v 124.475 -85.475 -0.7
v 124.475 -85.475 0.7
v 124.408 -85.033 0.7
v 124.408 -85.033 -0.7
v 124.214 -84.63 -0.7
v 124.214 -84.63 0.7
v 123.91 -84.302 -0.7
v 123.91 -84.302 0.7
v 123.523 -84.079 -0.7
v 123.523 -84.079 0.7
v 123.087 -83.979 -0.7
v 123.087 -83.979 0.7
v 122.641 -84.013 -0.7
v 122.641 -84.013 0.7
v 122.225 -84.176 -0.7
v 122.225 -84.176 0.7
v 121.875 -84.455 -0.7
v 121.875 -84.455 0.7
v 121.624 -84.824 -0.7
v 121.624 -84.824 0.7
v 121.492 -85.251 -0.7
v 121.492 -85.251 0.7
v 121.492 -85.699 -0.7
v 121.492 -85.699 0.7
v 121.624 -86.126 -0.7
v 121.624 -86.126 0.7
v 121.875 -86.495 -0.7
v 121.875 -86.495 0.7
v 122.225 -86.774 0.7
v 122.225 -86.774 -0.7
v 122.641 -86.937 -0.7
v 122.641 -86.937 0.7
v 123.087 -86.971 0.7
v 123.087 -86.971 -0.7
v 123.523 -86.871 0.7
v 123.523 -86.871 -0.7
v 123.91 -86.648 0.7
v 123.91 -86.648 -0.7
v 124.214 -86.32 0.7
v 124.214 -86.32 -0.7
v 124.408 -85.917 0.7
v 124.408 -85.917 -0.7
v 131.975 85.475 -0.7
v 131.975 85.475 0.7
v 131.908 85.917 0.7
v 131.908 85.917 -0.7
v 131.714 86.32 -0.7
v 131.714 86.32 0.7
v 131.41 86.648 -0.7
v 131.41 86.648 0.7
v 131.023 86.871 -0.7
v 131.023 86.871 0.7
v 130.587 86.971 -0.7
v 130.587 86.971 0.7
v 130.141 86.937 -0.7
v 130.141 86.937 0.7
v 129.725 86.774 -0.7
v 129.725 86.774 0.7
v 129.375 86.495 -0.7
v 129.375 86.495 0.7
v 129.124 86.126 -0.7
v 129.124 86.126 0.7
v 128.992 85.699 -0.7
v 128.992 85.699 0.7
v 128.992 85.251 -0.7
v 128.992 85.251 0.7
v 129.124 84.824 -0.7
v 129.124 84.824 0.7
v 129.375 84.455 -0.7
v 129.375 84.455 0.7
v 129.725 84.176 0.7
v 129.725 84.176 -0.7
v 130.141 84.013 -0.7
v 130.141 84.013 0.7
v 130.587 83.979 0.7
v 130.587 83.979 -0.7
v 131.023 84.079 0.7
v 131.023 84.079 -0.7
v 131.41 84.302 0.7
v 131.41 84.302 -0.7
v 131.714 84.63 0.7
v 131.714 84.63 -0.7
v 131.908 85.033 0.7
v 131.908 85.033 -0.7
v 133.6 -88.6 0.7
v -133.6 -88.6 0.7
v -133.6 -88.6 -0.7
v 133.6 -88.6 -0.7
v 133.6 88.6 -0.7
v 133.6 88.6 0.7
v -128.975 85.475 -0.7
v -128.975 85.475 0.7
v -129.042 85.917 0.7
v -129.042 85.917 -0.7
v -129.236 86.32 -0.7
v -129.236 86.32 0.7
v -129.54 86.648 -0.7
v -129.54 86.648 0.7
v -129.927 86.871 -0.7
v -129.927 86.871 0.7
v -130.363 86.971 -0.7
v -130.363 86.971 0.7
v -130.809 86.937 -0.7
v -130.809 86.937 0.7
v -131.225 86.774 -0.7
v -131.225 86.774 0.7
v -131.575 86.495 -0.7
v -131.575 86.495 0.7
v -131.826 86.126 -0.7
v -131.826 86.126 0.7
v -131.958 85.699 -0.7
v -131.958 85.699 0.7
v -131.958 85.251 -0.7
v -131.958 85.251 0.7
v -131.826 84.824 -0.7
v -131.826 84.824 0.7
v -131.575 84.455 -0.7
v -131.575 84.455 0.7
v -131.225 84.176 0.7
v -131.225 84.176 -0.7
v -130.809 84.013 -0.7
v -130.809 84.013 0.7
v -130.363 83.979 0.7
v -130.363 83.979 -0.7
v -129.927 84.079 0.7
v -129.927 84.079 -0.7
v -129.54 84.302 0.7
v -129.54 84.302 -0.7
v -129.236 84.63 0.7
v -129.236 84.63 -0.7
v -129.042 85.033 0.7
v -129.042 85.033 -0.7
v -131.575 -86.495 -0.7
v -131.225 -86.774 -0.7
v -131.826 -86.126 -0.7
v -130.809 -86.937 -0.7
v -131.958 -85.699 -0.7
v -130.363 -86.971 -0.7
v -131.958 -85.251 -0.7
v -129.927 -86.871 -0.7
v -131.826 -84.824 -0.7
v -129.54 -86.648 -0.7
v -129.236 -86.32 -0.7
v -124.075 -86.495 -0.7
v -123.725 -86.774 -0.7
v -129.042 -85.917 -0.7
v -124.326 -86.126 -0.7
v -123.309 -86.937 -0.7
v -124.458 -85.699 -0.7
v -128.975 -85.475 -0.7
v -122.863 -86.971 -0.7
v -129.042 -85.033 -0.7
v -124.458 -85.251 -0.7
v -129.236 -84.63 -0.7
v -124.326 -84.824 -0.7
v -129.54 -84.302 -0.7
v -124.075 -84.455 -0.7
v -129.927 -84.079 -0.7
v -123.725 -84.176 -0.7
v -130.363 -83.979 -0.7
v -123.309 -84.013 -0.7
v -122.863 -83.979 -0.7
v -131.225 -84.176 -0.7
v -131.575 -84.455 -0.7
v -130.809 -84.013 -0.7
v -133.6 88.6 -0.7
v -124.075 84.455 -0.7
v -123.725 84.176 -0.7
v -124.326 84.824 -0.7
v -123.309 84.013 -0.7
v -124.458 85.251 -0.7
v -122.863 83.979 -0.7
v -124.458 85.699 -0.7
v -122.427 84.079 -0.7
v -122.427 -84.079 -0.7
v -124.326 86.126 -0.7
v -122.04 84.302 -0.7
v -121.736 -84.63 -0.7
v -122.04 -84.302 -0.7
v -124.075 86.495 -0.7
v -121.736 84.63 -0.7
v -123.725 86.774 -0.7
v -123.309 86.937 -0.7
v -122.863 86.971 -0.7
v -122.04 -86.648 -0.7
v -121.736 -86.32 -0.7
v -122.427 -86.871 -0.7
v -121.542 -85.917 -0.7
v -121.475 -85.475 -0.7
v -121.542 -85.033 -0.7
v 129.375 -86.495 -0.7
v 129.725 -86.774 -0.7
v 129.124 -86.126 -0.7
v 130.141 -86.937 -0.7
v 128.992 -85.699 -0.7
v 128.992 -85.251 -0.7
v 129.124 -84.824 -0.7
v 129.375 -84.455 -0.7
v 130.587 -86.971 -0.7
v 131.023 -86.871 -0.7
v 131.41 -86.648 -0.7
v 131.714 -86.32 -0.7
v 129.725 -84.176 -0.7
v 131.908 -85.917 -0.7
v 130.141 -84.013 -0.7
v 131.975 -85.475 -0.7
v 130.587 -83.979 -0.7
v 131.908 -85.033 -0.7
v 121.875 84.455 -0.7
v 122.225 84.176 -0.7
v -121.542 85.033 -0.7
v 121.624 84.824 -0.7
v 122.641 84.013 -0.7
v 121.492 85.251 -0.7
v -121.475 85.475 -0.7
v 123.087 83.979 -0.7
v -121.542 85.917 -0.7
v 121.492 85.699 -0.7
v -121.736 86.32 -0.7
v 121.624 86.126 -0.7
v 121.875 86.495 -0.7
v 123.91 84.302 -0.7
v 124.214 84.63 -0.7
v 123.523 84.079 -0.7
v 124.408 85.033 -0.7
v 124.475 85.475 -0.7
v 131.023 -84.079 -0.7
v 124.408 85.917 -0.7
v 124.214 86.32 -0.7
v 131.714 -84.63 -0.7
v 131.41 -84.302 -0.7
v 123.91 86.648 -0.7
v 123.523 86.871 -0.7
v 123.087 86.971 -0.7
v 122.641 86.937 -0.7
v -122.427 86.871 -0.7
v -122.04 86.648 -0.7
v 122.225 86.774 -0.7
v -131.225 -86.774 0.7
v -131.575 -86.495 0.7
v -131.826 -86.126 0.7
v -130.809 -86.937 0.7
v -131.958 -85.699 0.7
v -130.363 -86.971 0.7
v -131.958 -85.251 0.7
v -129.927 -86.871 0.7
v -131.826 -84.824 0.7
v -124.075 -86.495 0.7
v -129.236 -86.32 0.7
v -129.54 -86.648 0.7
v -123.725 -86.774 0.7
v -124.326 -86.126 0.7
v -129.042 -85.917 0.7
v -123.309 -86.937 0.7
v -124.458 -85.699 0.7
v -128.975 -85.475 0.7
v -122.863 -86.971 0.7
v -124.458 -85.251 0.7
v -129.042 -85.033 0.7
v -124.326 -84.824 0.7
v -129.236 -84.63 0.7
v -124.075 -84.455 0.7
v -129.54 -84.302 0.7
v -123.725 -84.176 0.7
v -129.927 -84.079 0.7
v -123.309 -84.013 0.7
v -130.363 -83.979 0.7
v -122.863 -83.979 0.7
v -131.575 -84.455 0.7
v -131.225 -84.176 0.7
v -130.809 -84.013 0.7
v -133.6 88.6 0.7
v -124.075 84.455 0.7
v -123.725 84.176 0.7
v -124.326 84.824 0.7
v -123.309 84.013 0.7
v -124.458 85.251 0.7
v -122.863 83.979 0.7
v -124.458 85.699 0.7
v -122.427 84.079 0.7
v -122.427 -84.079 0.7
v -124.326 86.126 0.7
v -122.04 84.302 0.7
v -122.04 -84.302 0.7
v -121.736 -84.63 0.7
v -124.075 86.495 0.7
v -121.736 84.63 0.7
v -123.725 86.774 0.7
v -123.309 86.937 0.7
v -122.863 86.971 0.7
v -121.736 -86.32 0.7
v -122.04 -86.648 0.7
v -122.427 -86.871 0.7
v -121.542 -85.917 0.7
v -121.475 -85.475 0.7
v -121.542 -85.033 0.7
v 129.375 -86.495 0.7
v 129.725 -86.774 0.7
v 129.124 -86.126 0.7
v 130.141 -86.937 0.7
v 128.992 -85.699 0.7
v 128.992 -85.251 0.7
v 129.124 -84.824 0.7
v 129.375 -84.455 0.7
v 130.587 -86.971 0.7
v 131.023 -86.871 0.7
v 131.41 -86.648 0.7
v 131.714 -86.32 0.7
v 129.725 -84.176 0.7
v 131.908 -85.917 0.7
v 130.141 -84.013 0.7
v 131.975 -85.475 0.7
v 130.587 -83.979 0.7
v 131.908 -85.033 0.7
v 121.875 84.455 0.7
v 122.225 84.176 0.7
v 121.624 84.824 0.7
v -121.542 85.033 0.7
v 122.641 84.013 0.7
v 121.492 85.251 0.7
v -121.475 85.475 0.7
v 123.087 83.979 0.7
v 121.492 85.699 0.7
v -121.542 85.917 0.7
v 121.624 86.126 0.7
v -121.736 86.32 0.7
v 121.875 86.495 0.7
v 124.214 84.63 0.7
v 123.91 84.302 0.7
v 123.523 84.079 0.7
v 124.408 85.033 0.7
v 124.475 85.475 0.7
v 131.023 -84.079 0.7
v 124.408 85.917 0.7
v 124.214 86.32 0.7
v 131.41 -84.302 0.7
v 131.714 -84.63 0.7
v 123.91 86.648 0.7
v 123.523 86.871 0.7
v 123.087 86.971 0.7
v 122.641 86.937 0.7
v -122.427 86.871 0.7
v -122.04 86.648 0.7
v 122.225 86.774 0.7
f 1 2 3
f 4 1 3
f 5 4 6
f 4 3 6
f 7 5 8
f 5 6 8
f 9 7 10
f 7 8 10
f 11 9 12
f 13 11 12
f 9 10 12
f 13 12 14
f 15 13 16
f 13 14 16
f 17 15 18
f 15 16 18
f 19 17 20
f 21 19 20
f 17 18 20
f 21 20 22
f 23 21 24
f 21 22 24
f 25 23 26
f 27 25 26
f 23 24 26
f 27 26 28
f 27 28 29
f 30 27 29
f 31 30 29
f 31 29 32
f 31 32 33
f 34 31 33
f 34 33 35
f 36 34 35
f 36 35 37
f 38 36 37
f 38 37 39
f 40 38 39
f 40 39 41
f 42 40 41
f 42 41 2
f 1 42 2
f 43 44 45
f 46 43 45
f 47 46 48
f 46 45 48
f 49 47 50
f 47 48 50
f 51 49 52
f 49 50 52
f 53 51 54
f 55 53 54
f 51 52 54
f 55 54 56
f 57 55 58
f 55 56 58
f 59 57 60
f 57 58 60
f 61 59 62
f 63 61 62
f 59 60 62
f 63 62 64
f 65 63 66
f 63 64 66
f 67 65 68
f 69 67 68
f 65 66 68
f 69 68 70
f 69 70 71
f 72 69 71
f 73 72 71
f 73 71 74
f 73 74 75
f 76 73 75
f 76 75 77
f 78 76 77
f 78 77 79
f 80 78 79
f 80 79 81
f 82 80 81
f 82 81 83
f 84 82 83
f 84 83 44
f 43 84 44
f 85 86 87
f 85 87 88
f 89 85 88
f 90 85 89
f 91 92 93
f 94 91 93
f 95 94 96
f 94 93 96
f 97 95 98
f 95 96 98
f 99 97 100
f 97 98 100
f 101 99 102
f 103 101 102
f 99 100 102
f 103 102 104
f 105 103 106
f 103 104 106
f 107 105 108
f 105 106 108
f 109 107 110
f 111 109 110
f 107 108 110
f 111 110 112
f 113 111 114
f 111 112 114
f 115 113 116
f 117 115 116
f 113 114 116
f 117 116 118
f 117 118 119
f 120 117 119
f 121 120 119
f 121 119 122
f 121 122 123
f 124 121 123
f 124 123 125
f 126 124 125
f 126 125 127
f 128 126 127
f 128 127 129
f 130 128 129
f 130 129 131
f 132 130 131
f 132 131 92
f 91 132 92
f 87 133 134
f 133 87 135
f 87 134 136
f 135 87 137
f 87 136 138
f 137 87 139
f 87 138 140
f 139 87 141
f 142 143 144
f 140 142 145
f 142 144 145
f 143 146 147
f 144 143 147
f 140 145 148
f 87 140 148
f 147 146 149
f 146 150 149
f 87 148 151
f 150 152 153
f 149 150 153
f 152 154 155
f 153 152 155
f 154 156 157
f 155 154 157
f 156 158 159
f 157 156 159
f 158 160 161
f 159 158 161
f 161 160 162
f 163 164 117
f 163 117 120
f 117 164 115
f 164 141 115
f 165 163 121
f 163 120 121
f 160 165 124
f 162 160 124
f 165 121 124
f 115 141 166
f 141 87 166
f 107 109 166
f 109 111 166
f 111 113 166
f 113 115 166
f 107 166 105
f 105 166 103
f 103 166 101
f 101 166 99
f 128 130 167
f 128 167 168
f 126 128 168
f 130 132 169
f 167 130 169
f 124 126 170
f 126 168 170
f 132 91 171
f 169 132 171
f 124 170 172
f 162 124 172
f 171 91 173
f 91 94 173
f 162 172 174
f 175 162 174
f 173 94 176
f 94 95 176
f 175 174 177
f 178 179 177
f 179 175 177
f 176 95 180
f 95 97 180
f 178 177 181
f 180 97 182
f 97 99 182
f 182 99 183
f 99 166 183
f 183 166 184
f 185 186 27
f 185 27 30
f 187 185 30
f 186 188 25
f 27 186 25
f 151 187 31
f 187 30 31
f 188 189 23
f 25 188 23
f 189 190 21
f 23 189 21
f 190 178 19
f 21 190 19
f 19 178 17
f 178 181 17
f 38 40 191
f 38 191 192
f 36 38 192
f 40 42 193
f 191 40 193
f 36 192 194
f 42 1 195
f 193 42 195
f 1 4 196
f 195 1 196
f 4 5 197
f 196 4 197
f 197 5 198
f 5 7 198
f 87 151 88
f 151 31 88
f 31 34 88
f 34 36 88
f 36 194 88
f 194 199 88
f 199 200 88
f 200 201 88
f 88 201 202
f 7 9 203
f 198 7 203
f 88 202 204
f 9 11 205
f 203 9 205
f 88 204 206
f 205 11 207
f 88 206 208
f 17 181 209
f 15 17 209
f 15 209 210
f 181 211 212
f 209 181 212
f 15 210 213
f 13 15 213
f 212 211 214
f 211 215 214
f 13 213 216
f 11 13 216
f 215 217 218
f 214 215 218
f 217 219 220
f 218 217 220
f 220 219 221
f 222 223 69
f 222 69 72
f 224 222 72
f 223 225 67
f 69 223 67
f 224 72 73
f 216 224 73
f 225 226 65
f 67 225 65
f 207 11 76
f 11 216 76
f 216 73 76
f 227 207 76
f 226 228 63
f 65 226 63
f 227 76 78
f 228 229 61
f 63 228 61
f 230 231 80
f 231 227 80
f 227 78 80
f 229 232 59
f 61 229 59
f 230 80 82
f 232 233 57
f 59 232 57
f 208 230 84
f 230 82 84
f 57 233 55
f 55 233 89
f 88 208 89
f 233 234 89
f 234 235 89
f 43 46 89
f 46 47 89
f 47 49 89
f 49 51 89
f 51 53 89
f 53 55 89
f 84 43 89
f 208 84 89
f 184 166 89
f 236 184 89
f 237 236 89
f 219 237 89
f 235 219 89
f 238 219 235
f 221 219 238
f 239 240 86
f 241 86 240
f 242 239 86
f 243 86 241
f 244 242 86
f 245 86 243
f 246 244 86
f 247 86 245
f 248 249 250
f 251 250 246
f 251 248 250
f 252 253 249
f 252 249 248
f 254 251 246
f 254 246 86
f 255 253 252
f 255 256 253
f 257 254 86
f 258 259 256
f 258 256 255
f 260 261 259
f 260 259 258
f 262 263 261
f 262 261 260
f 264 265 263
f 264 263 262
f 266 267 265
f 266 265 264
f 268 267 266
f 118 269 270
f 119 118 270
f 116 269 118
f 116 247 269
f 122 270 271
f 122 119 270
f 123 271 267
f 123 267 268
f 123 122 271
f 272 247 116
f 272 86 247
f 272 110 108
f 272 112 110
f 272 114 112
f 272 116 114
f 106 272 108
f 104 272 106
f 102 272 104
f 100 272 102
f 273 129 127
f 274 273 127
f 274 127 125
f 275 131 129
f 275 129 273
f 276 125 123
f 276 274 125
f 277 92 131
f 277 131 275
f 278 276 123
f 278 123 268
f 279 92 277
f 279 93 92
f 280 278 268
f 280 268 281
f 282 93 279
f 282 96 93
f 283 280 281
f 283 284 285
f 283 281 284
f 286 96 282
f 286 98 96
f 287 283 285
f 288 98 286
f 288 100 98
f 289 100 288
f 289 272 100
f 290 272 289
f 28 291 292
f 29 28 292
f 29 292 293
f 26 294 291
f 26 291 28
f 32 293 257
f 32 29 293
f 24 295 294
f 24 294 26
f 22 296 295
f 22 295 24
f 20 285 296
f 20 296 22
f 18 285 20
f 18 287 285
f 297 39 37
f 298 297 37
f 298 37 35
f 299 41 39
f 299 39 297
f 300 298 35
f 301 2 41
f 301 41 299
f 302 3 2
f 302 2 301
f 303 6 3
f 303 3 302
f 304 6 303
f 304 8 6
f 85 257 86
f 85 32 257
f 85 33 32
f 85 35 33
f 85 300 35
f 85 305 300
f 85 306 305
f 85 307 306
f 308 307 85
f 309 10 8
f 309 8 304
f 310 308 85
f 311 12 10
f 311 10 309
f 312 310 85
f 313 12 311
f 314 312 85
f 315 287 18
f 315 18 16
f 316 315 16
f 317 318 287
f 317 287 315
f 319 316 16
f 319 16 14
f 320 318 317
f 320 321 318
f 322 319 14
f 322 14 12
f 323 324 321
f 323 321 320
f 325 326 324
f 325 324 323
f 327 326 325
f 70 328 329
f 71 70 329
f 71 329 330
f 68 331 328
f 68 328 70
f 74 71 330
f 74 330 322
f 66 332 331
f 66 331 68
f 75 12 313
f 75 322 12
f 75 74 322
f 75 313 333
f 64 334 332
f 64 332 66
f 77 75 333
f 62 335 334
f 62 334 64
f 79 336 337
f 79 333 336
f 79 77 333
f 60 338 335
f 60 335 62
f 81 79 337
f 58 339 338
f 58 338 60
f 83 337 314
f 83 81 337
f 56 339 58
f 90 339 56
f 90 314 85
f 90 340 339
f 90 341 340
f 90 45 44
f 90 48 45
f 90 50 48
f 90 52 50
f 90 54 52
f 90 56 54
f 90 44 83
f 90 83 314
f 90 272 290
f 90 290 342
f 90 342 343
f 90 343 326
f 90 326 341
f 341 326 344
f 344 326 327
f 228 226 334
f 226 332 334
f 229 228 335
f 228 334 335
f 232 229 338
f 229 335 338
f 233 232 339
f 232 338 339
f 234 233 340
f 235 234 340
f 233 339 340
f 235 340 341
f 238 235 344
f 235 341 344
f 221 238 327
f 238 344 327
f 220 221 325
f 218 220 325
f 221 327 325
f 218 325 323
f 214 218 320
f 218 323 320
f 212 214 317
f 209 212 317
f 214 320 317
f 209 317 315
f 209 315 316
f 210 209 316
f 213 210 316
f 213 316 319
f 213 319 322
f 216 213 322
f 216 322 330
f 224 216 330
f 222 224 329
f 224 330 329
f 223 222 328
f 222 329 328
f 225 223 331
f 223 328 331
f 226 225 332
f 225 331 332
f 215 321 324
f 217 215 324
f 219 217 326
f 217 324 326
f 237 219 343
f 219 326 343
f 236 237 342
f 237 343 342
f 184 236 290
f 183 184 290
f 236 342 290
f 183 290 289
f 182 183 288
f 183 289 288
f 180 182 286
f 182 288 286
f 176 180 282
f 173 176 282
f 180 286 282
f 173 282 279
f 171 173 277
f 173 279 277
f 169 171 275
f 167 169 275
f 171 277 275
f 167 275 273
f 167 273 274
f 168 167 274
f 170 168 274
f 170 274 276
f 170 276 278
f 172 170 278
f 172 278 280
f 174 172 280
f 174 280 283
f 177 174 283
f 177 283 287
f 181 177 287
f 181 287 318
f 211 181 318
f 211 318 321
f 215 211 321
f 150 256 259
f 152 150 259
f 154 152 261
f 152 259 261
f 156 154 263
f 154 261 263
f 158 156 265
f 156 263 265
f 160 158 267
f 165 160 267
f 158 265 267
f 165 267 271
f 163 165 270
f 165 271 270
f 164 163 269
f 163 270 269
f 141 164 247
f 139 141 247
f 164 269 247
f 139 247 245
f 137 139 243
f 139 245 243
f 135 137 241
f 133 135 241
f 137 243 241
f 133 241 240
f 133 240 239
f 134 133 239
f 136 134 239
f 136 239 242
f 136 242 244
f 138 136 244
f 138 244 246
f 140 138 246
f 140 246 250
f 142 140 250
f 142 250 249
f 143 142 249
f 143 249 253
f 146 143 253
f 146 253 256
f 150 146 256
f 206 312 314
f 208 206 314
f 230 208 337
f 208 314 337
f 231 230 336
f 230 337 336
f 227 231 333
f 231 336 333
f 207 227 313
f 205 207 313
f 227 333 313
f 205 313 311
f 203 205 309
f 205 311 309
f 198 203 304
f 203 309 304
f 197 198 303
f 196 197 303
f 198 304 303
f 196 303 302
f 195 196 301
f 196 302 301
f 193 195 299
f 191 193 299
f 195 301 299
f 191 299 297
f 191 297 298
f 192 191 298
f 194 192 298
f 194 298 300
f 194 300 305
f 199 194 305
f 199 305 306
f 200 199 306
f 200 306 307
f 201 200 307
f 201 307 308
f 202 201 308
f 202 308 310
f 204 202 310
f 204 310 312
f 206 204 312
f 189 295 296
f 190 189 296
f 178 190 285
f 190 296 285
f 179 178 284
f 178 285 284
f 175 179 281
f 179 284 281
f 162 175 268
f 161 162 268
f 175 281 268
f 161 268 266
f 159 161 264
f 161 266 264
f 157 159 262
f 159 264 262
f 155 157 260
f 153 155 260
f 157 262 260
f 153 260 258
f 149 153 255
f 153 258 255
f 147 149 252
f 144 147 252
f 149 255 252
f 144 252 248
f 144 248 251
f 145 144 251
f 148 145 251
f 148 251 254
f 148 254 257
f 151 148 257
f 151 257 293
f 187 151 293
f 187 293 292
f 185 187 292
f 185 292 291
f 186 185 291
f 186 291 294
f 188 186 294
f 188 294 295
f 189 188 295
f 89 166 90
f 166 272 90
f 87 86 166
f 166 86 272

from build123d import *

# Parameters (mm, degrees)
CROQUIS1_W              = 267.2
CROQUIS1_H              = 177.2
SALIENTE_EXTRUIR1_DEPTH = 0.7
CROQUIS2_R              = 1.5
CORTAR_EXTRUIR1_DEPTH   = 15.7


with BuildPart() as part:
    # Croquis1 → Saliente-Extruir1 (new, symmetric)
    with BuildSketch(Plane.XY):
        Rectangle(CROQUIS1_W, CROQUIS1_H)
    extrude(amount=SALIENTE_EXTRUIR1_DEPTH, both=True)

    # Croquis2 → Cortar-Extruir1 (cut, symmetric)
    with BuildSketch(Plane.XY.offset(0.7)):
        with Locations((-130.475, 85.475)):
            Circle(CROQUIS2_R)
        with Locations((-122.975, 85.475)):
            Circle(CROQUIS2_R)
        with Locations((-130.475, -85.475)):
            Circle(CROQUIS2_R)
        with Locations((-122.975, -85.475)):
            Circle(CROQUIS2_R)
        with Locations((130.475, -85.475)):
            Circle(CROQUIS2_R)
        with Locations((122.975, -85.475)):
            Circle(CROQUIS2_R)
        with Locations((130.475, 85.475)):
            Circle(CROQUIS2_R)
        with Locations((122.975, 85.475)):
            Circle(CROQUIS2_R)
    extrude(amount=CORTAR_EXTRUIR1_DEPTH, both=True, mode=Mode.SUBTRACT)


solid = part.part
